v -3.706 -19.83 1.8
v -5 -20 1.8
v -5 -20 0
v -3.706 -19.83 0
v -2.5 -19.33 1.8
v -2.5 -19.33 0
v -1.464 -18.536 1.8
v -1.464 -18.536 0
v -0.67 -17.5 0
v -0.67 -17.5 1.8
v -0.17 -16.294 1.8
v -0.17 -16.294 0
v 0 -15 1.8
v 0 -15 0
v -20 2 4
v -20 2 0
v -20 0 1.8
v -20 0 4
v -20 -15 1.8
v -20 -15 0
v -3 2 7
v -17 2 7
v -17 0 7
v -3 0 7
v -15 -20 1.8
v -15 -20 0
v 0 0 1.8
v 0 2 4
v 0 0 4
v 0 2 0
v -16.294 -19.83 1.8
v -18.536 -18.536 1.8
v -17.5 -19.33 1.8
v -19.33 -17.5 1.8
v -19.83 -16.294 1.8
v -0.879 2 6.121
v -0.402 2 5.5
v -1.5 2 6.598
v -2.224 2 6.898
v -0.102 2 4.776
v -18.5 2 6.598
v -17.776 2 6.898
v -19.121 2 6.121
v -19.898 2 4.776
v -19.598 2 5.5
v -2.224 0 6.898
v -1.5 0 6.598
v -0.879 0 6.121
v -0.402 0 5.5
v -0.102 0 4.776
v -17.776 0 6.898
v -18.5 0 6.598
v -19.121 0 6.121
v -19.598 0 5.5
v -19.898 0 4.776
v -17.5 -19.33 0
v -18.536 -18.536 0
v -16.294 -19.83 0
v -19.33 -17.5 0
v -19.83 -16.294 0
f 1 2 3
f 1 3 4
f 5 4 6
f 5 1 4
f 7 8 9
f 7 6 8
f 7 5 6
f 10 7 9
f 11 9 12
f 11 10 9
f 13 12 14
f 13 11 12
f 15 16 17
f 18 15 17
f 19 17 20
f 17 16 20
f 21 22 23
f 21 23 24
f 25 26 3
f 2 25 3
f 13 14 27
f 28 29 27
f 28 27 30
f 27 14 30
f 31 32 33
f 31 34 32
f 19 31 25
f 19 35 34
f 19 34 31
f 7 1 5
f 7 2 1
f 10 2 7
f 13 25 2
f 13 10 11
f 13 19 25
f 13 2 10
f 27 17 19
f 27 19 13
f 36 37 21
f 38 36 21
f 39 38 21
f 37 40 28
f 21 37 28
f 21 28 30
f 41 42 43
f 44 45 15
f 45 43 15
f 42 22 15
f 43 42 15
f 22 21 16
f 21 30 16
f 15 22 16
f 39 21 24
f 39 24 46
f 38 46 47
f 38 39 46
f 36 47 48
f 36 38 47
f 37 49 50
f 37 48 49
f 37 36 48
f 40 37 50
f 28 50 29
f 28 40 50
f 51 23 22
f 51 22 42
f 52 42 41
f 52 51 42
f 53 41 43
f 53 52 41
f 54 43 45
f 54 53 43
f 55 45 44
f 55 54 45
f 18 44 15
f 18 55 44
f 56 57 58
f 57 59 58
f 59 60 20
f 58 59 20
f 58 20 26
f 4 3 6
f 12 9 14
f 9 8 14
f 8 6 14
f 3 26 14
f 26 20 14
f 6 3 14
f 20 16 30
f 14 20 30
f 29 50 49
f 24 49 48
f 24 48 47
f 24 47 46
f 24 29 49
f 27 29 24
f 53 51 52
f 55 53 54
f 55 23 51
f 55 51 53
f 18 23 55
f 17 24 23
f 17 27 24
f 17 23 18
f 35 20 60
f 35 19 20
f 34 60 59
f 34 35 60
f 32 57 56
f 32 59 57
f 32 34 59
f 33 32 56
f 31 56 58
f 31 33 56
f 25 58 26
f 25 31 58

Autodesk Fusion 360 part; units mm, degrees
sketch "Sketch1" plane through (0, 0, 0) normal (0, 0, 1) x (1, 0, 0)
  line L0 (0, 0) -> (-20, 0)
  line L1 (-20, 0) -> (-20, -20)
  line L2 (-20, -20) -> (0, -20)
  line L3 (0, -20) -> (0, 0)
  line L4 (-20, 0) -> (0, 0)
  line L5 (0, 0) -> (0, 2)
  line L6 (0, 2) -> (-20, 2)
  line L7 (-20, 2) -> (-20, 0)
  dimension "d1" = 20
  dimension "d2" = 20
  dimension "d3" = 20
  dimension "d4" = 2
extrude "Extrude1" add sketch "Sketch1" along normal blind 1.8 contours L0 L1 L2 L3 L4
extrude "Extrude2" add sketch "Sketch1" along normal blind 7 contours L0 L4 L5 L6 L7
fillet "Fillet1" radius 3 2 edges at (0, 1, 7) (-20, 1, 7)
fillet "Fillet2" radius 5 2 edges at (0, -20, 0.9) (-20, -20, 0.9)
